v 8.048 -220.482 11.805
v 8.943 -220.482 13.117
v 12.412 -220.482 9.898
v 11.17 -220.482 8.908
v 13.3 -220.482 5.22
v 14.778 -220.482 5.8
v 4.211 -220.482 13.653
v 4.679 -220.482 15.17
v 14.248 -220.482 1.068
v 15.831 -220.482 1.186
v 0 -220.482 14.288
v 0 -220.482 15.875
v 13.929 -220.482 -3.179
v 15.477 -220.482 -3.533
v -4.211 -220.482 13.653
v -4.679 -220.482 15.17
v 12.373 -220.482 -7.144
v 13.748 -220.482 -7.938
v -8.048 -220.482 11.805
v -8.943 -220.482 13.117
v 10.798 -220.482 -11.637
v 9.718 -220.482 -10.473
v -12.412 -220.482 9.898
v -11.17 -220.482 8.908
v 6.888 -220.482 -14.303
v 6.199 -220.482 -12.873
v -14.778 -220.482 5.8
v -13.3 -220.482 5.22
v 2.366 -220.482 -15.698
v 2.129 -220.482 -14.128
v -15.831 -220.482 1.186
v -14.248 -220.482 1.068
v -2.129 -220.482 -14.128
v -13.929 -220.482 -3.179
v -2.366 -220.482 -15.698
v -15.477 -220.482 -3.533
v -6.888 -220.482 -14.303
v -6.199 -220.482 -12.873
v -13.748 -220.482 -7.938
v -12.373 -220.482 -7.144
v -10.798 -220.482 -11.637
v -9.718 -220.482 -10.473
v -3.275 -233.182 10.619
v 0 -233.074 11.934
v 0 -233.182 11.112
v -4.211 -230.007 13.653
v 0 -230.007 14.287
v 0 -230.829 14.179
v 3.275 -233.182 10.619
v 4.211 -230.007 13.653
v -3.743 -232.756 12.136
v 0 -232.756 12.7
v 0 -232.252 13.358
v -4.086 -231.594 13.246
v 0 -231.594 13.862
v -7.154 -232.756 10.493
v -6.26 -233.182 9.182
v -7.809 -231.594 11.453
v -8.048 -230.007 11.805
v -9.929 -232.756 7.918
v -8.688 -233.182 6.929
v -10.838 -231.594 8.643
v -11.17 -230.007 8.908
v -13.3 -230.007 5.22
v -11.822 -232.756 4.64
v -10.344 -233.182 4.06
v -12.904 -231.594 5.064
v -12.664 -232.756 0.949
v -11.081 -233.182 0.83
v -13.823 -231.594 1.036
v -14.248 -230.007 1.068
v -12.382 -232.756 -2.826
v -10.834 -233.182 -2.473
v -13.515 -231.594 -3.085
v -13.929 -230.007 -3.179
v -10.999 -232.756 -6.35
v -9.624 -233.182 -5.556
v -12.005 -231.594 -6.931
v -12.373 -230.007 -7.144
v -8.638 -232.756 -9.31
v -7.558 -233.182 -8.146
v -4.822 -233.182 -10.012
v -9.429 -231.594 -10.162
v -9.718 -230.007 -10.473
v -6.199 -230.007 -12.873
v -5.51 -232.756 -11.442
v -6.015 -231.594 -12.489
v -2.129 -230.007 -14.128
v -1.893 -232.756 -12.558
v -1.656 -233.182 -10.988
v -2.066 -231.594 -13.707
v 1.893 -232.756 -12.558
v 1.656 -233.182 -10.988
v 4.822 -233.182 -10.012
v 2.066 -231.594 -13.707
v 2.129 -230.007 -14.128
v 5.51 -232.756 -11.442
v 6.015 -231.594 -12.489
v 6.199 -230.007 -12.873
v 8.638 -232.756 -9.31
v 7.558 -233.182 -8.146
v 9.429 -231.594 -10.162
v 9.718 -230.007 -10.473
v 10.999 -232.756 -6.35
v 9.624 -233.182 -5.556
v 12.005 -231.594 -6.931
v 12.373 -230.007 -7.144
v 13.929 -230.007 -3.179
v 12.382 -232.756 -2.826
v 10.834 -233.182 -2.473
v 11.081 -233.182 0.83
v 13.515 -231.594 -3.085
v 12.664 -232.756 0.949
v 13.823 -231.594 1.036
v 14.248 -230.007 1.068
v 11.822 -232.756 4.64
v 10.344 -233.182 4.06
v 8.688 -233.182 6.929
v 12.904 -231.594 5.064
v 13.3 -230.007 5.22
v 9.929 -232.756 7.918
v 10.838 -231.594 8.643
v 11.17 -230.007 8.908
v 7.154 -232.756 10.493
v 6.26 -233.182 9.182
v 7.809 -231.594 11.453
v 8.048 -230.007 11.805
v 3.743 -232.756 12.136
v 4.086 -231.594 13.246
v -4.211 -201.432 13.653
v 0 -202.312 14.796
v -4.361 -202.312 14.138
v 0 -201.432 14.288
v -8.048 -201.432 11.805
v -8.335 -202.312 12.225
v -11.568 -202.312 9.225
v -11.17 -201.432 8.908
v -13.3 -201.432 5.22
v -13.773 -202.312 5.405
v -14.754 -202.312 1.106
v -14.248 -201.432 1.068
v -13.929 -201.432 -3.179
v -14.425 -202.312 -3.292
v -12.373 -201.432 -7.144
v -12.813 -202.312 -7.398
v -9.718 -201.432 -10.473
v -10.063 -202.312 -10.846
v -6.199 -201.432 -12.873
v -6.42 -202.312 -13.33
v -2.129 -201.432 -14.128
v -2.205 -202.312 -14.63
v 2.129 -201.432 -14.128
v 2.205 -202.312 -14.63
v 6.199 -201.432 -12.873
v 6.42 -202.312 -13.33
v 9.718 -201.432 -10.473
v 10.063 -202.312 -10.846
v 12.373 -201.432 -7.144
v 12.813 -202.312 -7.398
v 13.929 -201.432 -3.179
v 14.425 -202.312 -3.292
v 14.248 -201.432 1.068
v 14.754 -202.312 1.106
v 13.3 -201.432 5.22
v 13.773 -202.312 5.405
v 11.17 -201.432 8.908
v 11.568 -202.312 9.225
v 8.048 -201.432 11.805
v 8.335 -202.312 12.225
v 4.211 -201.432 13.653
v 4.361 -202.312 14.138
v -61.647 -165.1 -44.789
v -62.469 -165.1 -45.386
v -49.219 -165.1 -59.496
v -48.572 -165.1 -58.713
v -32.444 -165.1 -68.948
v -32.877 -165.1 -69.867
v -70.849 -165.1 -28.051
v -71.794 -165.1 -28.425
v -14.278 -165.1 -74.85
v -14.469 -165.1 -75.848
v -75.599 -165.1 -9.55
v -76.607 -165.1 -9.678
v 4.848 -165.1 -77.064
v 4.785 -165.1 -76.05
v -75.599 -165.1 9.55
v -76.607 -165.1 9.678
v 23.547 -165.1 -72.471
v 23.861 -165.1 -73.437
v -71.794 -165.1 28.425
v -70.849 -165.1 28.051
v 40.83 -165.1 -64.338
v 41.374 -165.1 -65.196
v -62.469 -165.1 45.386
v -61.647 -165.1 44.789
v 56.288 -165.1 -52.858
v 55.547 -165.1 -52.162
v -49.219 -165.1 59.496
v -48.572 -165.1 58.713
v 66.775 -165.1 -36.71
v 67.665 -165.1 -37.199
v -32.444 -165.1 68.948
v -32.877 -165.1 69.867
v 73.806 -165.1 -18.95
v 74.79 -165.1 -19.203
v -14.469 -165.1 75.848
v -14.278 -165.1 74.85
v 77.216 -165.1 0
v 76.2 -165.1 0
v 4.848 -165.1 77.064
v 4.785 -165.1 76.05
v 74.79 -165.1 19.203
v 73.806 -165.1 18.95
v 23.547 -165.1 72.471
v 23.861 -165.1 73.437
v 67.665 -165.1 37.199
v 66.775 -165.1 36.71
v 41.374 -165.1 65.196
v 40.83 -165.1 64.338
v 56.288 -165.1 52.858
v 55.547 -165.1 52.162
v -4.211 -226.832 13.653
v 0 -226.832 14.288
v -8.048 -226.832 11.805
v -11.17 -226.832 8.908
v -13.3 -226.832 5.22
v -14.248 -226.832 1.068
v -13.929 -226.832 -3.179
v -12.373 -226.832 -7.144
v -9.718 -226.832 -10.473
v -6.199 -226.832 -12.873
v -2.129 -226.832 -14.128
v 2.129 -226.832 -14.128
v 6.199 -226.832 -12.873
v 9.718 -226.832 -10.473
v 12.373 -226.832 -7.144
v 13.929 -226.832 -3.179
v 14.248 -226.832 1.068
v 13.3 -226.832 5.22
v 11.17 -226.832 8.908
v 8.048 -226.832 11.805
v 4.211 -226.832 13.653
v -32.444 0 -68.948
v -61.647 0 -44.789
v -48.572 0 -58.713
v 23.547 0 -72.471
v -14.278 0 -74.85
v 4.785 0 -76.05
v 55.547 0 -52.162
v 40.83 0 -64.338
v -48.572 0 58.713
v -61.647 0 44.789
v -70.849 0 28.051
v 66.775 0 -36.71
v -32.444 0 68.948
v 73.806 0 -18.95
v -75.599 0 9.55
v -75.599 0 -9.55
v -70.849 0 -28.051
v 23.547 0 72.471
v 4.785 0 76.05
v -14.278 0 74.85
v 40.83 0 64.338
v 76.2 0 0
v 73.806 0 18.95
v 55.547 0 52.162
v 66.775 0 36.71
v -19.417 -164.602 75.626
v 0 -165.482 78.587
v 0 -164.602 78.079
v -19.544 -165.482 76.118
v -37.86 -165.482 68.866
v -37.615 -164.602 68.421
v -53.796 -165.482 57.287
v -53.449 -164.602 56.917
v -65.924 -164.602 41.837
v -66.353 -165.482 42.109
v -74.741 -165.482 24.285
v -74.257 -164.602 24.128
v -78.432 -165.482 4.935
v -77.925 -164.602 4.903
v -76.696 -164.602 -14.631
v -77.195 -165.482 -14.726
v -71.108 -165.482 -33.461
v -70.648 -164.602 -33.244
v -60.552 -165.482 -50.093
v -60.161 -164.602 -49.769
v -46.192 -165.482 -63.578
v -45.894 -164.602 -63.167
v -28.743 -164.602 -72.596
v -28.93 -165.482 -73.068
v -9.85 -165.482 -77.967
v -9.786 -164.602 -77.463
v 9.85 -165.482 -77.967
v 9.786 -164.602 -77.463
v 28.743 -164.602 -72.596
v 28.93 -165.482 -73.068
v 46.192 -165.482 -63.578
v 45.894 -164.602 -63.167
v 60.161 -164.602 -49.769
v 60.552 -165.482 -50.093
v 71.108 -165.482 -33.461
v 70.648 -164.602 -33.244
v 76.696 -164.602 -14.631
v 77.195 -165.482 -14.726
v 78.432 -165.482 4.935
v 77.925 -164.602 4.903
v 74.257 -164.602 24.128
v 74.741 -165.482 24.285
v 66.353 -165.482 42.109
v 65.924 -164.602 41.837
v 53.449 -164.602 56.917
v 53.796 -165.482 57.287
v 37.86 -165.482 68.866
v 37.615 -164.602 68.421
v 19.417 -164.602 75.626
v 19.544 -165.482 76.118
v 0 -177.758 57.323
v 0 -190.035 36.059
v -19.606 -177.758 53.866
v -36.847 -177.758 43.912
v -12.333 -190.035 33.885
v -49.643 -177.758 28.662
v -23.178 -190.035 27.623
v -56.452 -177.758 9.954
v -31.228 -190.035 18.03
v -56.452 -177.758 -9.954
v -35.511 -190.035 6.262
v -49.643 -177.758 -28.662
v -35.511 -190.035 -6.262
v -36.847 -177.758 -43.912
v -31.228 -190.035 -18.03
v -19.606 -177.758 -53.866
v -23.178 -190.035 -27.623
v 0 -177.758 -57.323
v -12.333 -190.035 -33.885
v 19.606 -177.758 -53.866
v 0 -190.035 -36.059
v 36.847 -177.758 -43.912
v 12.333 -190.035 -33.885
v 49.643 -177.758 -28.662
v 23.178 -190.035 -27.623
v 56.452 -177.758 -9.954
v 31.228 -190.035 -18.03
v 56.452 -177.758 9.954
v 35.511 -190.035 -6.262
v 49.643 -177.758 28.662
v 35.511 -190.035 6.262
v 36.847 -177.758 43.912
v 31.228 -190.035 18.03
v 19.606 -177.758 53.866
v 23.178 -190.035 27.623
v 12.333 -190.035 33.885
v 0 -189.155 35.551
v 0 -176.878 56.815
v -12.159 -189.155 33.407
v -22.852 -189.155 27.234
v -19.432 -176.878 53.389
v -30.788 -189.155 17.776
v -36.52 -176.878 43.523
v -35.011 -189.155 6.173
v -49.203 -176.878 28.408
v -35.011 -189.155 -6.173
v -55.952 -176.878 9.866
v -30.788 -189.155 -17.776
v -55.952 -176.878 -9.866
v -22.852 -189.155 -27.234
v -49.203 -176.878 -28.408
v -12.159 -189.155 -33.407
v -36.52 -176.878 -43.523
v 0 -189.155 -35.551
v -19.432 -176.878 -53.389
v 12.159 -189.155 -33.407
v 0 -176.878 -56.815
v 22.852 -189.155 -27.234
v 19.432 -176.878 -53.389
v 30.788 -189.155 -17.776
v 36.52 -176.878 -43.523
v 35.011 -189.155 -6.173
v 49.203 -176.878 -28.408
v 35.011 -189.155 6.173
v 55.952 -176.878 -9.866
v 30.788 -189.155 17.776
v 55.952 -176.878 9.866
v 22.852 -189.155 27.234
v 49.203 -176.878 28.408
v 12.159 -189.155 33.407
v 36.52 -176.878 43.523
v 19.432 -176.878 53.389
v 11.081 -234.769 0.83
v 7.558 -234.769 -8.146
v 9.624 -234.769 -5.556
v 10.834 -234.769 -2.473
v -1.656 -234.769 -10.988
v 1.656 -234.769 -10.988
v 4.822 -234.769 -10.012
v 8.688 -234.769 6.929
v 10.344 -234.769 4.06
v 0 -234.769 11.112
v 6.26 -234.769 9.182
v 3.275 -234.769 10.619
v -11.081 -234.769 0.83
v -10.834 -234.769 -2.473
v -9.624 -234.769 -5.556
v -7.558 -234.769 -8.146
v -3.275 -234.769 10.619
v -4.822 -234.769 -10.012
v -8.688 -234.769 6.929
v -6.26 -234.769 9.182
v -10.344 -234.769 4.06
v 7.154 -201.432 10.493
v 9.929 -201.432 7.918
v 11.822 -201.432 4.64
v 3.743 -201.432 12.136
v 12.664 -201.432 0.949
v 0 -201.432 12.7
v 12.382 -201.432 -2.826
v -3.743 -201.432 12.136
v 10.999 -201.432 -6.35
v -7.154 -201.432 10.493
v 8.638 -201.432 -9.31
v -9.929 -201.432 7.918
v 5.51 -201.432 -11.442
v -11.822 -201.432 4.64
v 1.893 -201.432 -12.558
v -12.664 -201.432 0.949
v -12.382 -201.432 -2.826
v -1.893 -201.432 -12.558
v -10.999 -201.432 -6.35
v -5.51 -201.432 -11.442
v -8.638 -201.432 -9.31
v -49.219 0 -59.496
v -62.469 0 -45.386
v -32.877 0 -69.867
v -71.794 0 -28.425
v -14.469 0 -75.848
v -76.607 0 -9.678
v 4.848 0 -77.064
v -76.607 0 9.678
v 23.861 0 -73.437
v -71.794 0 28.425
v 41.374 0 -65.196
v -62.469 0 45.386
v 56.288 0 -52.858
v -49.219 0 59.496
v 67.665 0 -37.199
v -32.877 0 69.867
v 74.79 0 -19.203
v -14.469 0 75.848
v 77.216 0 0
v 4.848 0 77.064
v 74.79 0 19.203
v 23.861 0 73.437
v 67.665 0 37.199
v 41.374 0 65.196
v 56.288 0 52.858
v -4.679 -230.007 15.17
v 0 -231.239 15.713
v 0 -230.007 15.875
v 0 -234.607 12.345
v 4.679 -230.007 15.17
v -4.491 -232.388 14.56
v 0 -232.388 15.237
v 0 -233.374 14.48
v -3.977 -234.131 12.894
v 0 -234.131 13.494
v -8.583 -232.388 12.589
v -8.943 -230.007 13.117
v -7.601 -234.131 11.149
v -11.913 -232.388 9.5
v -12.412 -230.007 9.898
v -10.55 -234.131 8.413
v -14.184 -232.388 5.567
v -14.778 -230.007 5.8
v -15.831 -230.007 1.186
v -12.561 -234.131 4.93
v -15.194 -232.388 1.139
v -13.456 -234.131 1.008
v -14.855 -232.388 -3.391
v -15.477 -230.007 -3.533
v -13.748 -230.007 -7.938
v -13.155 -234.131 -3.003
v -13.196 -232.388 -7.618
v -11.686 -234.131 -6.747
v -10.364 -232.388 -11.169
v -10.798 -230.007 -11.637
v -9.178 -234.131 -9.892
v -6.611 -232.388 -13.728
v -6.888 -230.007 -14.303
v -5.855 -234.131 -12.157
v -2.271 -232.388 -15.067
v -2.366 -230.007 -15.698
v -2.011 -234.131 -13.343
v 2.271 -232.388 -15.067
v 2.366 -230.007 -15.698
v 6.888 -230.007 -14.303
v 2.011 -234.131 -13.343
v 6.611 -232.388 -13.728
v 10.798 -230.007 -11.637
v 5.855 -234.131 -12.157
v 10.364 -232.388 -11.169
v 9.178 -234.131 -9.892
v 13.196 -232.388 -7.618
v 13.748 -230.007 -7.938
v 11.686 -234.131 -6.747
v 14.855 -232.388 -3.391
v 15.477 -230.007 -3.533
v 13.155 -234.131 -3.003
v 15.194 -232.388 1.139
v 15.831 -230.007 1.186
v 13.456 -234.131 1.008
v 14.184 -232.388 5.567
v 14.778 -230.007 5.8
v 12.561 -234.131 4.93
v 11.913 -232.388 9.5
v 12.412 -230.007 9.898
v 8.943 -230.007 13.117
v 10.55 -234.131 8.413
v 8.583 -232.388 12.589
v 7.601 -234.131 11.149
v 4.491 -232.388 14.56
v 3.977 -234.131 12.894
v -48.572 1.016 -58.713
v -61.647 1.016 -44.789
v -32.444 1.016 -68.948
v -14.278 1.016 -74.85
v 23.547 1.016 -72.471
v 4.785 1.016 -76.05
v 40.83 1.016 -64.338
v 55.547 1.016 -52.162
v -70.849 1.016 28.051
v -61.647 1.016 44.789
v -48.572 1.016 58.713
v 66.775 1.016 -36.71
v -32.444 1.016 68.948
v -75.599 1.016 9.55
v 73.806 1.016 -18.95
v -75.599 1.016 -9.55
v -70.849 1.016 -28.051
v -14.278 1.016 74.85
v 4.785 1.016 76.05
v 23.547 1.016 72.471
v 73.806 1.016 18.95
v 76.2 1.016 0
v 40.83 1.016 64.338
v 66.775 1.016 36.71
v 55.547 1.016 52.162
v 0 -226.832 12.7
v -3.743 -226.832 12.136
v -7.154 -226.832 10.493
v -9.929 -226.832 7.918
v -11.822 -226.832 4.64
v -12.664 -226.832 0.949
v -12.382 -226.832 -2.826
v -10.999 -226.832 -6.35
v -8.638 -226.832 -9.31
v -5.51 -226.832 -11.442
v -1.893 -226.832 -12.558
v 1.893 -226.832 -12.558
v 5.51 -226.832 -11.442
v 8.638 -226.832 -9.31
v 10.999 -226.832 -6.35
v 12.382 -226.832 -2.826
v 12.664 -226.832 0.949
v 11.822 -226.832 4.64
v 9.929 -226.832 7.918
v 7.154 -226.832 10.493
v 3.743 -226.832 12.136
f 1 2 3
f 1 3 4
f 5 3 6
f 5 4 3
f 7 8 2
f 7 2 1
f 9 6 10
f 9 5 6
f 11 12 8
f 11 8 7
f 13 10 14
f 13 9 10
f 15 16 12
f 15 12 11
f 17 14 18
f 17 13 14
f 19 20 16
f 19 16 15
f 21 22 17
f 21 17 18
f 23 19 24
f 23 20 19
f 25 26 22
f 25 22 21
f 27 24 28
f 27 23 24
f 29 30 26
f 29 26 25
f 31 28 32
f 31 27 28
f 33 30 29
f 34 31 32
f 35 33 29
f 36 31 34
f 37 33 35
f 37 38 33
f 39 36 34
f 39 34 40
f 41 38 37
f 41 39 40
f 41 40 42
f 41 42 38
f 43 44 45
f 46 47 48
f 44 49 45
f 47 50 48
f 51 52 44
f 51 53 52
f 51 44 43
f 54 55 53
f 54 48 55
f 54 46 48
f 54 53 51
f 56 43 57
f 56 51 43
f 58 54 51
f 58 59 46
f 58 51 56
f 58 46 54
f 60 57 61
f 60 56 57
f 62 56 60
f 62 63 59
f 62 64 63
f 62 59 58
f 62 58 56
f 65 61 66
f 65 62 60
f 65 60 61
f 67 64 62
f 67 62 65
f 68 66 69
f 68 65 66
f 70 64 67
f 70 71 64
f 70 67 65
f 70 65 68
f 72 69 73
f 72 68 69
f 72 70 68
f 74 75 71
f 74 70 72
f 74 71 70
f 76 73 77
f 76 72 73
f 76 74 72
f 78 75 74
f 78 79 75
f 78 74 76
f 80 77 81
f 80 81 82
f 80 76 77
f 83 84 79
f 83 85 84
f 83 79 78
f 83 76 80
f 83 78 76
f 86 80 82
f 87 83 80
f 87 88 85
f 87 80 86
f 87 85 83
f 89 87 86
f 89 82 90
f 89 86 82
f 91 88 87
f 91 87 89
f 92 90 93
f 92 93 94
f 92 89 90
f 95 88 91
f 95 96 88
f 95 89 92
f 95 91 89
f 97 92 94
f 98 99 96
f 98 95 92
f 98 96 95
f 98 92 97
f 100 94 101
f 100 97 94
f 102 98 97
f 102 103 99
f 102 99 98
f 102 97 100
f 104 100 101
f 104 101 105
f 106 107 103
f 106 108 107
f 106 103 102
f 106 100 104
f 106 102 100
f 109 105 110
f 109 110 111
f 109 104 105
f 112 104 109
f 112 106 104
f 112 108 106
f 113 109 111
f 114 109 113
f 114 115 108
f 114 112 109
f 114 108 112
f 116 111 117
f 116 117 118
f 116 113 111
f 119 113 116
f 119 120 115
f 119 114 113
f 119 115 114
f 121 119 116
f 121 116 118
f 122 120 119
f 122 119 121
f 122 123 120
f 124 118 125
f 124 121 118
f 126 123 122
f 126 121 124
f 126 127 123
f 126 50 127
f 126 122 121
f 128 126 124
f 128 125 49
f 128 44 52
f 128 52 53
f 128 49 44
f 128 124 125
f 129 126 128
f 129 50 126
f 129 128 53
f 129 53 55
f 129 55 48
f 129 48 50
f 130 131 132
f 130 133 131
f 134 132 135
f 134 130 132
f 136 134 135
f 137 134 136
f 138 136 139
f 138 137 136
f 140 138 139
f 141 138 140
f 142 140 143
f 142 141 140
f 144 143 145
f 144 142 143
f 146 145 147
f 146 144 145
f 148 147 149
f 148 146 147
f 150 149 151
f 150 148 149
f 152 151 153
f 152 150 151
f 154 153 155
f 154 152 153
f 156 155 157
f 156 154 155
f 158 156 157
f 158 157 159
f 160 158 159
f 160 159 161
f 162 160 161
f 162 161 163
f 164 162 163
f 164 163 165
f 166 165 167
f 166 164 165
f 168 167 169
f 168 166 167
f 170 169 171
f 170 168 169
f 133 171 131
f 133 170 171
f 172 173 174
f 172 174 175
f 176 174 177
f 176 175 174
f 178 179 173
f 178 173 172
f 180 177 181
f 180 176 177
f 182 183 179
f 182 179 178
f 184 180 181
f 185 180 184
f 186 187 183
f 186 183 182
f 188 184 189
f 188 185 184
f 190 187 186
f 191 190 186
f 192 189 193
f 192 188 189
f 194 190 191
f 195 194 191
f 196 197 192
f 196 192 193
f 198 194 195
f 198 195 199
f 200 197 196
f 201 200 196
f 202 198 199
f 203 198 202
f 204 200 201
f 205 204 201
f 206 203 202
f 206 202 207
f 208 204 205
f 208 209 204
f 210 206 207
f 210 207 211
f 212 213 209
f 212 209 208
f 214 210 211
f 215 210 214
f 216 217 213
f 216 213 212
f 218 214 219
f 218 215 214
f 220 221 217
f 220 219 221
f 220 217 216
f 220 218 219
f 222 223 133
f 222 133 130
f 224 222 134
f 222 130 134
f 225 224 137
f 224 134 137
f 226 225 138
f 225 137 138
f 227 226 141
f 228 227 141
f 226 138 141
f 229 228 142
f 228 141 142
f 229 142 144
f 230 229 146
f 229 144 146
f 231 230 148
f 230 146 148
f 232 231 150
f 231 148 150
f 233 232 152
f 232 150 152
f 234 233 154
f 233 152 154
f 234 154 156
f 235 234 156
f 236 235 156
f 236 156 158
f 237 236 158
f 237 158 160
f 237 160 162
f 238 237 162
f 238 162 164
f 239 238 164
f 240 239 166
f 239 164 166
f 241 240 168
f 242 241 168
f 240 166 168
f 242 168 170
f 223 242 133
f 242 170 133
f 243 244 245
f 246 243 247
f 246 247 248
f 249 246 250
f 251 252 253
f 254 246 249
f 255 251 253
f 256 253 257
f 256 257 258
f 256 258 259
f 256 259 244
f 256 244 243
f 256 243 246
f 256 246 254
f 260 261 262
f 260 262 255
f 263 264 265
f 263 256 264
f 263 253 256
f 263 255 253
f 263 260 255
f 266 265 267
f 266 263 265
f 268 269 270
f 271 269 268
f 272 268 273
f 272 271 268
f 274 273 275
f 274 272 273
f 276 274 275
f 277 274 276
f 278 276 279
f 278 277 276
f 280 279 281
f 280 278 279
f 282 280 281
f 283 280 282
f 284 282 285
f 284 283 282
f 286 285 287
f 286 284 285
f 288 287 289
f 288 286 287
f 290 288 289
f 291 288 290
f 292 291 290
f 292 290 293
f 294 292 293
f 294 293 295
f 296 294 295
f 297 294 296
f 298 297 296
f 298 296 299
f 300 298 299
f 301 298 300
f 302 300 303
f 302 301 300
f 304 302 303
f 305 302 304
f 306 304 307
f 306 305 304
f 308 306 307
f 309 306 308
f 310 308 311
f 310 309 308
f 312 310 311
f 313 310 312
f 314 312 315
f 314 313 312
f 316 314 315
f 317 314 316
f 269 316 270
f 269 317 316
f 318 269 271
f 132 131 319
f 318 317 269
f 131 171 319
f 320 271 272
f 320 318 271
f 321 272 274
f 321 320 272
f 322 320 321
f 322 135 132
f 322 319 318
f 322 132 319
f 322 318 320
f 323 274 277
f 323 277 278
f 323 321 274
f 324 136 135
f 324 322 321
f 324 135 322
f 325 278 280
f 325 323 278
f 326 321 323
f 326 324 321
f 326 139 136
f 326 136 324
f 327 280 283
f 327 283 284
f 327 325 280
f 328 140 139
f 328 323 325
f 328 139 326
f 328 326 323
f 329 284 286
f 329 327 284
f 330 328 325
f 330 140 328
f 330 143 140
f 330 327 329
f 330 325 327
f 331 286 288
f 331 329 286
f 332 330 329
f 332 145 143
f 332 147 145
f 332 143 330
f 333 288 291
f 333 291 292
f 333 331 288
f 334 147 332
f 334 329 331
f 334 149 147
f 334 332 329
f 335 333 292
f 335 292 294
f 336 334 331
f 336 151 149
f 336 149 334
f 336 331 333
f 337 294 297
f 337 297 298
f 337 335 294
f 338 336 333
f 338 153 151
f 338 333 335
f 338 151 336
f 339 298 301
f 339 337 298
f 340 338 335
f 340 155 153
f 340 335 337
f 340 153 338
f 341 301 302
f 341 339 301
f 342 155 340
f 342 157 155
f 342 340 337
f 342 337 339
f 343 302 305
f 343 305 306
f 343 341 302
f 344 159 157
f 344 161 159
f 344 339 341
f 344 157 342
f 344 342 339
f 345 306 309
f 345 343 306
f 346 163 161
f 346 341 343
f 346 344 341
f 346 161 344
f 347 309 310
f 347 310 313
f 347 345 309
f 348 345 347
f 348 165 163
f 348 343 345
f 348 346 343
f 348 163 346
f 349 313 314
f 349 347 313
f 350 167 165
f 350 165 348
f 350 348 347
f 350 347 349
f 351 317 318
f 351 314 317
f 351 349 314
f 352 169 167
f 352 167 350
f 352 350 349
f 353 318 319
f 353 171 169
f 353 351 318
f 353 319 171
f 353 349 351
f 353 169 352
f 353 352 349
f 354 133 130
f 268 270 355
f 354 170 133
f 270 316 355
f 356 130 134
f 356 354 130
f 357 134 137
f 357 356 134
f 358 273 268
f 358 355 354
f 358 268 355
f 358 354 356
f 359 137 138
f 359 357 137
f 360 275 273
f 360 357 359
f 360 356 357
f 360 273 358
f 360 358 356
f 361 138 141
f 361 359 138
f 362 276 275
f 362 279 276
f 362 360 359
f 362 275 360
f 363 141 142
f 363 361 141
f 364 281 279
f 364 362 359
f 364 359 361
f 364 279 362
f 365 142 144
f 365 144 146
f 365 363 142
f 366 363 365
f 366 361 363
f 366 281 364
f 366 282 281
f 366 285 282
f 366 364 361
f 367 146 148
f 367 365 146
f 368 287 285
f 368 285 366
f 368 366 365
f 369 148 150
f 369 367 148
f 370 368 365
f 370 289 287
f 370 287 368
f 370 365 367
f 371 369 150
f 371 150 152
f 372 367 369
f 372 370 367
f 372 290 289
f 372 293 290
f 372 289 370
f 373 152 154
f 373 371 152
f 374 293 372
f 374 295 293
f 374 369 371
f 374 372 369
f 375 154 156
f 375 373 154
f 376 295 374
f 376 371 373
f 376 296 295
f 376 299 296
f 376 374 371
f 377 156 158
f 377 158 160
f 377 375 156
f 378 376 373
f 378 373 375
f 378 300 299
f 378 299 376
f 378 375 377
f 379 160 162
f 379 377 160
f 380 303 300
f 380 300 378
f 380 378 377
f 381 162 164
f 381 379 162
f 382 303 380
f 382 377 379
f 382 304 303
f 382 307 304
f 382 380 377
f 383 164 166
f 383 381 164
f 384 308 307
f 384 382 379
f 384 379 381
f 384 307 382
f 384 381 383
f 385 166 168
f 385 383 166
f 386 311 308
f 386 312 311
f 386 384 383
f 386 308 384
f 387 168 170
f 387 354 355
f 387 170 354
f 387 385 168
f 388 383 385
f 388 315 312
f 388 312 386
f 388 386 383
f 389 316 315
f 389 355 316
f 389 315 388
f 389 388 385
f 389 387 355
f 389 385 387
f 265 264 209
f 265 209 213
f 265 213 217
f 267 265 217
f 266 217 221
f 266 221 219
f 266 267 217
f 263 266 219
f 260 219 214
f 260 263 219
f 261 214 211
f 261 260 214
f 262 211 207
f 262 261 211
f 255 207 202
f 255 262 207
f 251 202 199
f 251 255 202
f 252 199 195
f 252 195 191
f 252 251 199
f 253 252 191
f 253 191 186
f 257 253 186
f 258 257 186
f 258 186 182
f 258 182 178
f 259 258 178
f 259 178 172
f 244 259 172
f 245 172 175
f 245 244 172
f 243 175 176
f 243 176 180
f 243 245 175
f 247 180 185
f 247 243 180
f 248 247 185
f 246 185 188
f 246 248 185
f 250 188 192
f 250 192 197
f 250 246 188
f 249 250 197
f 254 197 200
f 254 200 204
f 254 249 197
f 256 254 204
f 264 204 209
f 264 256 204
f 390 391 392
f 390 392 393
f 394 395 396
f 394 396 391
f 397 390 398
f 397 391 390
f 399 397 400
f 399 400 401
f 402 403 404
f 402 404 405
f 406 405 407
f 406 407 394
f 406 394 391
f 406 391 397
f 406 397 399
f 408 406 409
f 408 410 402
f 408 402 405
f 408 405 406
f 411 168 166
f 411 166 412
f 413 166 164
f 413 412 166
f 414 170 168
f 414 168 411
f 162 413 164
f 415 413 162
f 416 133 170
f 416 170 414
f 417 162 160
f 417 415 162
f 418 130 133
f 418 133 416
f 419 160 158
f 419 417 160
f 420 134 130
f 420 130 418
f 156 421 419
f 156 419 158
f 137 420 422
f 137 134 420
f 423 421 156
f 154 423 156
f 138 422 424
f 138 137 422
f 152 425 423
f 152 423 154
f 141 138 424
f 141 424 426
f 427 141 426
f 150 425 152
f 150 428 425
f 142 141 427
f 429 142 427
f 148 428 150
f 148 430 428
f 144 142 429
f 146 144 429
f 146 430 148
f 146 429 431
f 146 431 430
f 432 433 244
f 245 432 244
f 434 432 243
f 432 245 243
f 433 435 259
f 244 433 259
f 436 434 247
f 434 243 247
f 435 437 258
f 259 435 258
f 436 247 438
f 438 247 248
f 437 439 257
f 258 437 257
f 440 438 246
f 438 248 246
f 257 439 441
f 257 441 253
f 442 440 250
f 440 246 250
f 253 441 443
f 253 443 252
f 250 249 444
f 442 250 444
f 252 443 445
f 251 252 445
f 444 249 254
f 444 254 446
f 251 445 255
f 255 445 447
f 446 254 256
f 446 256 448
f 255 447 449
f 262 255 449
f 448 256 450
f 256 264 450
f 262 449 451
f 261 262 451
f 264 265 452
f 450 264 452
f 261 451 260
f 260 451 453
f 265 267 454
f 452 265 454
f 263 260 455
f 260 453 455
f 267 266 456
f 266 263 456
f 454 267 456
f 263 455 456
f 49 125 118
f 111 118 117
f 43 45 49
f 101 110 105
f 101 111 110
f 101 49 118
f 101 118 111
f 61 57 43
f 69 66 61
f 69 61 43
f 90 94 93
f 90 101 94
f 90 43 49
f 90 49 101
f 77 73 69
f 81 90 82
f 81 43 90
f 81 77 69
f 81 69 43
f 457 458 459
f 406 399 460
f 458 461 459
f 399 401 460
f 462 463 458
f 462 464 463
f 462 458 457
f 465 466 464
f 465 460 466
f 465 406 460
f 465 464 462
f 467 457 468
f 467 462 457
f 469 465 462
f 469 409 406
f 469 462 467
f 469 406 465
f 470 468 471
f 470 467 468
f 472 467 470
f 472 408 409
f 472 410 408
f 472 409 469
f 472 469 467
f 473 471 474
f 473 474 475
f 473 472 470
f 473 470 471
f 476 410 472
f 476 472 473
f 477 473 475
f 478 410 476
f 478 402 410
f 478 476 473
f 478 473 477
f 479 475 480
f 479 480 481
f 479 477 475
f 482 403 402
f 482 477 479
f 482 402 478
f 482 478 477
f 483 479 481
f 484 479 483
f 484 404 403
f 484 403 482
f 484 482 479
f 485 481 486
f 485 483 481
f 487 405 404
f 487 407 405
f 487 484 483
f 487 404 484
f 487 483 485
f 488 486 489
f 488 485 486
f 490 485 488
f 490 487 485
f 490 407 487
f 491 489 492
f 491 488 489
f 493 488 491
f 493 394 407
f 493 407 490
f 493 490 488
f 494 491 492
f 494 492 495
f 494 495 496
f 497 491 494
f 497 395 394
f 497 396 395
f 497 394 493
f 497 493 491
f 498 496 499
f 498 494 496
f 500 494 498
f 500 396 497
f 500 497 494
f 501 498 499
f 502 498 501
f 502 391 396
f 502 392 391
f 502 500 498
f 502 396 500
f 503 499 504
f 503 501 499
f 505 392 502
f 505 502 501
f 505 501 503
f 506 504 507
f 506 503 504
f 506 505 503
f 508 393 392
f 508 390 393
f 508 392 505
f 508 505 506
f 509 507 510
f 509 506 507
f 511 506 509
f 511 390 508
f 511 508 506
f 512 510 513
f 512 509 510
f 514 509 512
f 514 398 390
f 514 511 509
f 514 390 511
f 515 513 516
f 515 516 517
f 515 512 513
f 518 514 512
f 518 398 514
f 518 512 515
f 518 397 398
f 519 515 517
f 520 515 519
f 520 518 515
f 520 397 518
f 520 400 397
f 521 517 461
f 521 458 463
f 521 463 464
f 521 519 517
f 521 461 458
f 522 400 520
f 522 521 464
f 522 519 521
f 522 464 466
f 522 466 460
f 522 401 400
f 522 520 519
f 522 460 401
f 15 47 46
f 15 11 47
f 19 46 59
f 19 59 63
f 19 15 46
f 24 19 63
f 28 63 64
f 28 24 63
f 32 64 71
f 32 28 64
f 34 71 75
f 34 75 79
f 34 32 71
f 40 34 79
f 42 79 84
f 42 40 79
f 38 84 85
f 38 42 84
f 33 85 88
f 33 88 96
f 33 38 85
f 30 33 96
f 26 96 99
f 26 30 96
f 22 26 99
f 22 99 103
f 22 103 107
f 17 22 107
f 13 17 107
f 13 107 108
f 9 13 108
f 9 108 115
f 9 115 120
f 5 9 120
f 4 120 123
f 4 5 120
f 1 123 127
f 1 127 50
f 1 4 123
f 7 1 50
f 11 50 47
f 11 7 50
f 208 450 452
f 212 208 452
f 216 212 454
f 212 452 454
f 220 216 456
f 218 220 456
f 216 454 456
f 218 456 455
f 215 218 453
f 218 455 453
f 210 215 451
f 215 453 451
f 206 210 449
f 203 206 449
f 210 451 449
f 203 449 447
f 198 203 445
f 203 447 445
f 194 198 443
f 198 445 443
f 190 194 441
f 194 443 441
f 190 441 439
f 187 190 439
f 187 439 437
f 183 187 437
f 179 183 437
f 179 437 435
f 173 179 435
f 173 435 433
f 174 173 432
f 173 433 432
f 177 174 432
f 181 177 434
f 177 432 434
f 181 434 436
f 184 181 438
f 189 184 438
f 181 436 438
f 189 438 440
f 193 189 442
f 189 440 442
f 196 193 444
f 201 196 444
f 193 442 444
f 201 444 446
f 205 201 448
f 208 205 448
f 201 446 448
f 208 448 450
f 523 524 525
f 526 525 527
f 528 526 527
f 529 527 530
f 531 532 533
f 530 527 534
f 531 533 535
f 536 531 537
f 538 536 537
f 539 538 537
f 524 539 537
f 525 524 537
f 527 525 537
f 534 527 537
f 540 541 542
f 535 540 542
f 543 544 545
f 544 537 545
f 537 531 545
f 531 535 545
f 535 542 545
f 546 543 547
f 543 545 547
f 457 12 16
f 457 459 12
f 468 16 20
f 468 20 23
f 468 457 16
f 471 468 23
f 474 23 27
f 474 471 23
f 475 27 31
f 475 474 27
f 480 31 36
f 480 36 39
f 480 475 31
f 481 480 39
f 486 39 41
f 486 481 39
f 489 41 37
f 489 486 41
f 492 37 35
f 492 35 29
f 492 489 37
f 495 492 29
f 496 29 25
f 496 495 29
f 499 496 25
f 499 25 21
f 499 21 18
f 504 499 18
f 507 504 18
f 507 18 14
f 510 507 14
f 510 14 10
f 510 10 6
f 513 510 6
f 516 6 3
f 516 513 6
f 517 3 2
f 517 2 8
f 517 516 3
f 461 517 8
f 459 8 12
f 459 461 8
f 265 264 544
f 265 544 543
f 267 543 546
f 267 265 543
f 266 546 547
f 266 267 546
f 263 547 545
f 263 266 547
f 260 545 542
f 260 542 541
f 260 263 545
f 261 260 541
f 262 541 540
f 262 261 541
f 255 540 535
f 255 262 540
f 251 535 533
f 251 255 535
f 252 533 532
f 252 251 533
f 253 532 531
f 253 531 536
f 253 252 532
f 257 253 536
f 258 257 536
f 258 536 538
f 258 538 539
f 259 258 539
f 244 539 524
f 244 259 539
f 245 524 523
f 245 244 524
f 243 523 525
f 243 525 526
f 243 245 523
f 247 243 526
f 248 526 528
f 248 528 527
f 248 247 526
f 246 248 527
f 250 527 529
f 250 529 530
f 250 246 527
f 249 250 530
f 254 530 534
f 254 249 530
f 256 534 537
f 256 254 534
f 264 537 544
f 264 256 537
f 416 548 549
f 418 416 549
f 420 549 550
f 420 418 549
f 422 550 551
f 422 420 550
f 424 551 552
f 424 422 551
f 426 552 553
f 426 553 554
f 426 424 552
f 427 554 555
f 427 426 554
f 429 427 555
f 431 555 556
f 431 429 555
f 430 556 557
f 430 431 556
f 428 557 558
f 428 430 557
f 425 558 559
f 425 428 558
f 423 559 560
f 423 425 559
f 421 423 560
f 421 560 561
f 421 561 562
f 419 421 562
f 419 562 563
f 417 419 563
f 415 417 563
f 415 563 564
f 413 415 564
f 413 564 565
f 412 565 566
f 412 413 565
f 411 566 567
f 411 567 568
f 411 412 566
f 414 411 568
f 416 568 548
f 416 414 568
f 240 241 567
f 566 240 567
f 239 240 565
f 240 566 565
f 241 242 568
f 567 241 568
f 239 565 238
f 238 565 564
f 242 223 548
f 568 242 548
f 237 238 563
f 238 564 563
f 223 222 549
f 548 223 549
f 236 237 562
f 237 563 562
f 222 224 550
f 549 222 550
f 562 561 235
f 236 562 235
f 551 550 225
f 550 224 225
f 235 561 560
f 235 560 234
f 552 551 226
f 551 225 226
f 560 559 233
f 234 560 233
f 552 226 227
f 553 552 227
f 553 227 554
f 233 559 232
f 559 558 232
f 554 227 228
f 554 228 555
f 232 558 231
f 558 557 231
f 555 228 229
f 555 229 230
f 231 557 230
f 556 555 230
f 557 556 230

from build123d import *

# Parameters (mm, degrees)
F0_R     = 77.216
F0_R_2   = 76.2
F1_DEPTH = 165.1
F2_DEPTH = 1.016
F5_W     = 25.4
F5_H     = 1.5875


with BuildPart() as f1:
    # F0 (on Front) → F1 (new body)
    with BuildSketch(Plane.XZ):
        Circle(F0_R)
        Circle(F0_R_2, mode=Mode.SUBTRACT)
    extrude(amount=F1_DEPTH)


with BuildPart() as f2:
    # F0 (on Front) → F2 (new body)
    with BuildSketch(Plane.XZ):
        Circle(F0_R_2)
    extrude(amount=-F2_DEPTH)


with BuildPart() as f4:
    # F3 (on Right) → F4 (revolve)
    with BuildSketch(Plane.YZ):
        Polygon((-201.431786, 14.2875), (-164.601786, 78.078931), (-165.481668, 78.586931), (-202.311668, 14.7955), align=None)
    revolve(axis=Axis((0, -97.843254, 0), (0, -1, 0)))


with BuildPart() as f6:
    # F5 (on Right) → F6 (revolve)
    with BuildSketch(Plane.YZ):
        with Locations((-214.131786, 13.49375)):
            Rectangle(F5_W, F5_H)
    revolve(axis=Axis((0, -128.725841, 0), (0, -1, 0)))


with BuildPart() as f8:
    # F7 (on Right) → F8 (revolve)
    with BuildSketch(Plane.YZ):
        with BuildLine():
            Line((-230.006786, 14.2875), (-220.481786, 14.2875))
            Line((-220.481786, 14.2875), (-220.481786, 15.875))
            Line((-220.481786, 15.875), (-230.006786, 15.875))
            ThreePointArc((-230.006786, 15.875), (-233.374382, 14.480096), (-234.769286, 11.1125))
            Line((-234.769286, 11.1125), (-234.769286, 0))
            Line((-234.769286, 0), (-233.181786, 0))
            Line((-233.181786, 0), (-233.181786, 11.1125))
            ThreePointArc((-233.181786, 11.1125), (-232.25185, 13.357564), (-230.006786, 14.2875))
        make_face()
    revolve(axis=Axis((0, -147.307113, 0), (0, -1, 0)))


solid = Compound([f1.part, f2.part, f4.part, f6.part, f8.part])
